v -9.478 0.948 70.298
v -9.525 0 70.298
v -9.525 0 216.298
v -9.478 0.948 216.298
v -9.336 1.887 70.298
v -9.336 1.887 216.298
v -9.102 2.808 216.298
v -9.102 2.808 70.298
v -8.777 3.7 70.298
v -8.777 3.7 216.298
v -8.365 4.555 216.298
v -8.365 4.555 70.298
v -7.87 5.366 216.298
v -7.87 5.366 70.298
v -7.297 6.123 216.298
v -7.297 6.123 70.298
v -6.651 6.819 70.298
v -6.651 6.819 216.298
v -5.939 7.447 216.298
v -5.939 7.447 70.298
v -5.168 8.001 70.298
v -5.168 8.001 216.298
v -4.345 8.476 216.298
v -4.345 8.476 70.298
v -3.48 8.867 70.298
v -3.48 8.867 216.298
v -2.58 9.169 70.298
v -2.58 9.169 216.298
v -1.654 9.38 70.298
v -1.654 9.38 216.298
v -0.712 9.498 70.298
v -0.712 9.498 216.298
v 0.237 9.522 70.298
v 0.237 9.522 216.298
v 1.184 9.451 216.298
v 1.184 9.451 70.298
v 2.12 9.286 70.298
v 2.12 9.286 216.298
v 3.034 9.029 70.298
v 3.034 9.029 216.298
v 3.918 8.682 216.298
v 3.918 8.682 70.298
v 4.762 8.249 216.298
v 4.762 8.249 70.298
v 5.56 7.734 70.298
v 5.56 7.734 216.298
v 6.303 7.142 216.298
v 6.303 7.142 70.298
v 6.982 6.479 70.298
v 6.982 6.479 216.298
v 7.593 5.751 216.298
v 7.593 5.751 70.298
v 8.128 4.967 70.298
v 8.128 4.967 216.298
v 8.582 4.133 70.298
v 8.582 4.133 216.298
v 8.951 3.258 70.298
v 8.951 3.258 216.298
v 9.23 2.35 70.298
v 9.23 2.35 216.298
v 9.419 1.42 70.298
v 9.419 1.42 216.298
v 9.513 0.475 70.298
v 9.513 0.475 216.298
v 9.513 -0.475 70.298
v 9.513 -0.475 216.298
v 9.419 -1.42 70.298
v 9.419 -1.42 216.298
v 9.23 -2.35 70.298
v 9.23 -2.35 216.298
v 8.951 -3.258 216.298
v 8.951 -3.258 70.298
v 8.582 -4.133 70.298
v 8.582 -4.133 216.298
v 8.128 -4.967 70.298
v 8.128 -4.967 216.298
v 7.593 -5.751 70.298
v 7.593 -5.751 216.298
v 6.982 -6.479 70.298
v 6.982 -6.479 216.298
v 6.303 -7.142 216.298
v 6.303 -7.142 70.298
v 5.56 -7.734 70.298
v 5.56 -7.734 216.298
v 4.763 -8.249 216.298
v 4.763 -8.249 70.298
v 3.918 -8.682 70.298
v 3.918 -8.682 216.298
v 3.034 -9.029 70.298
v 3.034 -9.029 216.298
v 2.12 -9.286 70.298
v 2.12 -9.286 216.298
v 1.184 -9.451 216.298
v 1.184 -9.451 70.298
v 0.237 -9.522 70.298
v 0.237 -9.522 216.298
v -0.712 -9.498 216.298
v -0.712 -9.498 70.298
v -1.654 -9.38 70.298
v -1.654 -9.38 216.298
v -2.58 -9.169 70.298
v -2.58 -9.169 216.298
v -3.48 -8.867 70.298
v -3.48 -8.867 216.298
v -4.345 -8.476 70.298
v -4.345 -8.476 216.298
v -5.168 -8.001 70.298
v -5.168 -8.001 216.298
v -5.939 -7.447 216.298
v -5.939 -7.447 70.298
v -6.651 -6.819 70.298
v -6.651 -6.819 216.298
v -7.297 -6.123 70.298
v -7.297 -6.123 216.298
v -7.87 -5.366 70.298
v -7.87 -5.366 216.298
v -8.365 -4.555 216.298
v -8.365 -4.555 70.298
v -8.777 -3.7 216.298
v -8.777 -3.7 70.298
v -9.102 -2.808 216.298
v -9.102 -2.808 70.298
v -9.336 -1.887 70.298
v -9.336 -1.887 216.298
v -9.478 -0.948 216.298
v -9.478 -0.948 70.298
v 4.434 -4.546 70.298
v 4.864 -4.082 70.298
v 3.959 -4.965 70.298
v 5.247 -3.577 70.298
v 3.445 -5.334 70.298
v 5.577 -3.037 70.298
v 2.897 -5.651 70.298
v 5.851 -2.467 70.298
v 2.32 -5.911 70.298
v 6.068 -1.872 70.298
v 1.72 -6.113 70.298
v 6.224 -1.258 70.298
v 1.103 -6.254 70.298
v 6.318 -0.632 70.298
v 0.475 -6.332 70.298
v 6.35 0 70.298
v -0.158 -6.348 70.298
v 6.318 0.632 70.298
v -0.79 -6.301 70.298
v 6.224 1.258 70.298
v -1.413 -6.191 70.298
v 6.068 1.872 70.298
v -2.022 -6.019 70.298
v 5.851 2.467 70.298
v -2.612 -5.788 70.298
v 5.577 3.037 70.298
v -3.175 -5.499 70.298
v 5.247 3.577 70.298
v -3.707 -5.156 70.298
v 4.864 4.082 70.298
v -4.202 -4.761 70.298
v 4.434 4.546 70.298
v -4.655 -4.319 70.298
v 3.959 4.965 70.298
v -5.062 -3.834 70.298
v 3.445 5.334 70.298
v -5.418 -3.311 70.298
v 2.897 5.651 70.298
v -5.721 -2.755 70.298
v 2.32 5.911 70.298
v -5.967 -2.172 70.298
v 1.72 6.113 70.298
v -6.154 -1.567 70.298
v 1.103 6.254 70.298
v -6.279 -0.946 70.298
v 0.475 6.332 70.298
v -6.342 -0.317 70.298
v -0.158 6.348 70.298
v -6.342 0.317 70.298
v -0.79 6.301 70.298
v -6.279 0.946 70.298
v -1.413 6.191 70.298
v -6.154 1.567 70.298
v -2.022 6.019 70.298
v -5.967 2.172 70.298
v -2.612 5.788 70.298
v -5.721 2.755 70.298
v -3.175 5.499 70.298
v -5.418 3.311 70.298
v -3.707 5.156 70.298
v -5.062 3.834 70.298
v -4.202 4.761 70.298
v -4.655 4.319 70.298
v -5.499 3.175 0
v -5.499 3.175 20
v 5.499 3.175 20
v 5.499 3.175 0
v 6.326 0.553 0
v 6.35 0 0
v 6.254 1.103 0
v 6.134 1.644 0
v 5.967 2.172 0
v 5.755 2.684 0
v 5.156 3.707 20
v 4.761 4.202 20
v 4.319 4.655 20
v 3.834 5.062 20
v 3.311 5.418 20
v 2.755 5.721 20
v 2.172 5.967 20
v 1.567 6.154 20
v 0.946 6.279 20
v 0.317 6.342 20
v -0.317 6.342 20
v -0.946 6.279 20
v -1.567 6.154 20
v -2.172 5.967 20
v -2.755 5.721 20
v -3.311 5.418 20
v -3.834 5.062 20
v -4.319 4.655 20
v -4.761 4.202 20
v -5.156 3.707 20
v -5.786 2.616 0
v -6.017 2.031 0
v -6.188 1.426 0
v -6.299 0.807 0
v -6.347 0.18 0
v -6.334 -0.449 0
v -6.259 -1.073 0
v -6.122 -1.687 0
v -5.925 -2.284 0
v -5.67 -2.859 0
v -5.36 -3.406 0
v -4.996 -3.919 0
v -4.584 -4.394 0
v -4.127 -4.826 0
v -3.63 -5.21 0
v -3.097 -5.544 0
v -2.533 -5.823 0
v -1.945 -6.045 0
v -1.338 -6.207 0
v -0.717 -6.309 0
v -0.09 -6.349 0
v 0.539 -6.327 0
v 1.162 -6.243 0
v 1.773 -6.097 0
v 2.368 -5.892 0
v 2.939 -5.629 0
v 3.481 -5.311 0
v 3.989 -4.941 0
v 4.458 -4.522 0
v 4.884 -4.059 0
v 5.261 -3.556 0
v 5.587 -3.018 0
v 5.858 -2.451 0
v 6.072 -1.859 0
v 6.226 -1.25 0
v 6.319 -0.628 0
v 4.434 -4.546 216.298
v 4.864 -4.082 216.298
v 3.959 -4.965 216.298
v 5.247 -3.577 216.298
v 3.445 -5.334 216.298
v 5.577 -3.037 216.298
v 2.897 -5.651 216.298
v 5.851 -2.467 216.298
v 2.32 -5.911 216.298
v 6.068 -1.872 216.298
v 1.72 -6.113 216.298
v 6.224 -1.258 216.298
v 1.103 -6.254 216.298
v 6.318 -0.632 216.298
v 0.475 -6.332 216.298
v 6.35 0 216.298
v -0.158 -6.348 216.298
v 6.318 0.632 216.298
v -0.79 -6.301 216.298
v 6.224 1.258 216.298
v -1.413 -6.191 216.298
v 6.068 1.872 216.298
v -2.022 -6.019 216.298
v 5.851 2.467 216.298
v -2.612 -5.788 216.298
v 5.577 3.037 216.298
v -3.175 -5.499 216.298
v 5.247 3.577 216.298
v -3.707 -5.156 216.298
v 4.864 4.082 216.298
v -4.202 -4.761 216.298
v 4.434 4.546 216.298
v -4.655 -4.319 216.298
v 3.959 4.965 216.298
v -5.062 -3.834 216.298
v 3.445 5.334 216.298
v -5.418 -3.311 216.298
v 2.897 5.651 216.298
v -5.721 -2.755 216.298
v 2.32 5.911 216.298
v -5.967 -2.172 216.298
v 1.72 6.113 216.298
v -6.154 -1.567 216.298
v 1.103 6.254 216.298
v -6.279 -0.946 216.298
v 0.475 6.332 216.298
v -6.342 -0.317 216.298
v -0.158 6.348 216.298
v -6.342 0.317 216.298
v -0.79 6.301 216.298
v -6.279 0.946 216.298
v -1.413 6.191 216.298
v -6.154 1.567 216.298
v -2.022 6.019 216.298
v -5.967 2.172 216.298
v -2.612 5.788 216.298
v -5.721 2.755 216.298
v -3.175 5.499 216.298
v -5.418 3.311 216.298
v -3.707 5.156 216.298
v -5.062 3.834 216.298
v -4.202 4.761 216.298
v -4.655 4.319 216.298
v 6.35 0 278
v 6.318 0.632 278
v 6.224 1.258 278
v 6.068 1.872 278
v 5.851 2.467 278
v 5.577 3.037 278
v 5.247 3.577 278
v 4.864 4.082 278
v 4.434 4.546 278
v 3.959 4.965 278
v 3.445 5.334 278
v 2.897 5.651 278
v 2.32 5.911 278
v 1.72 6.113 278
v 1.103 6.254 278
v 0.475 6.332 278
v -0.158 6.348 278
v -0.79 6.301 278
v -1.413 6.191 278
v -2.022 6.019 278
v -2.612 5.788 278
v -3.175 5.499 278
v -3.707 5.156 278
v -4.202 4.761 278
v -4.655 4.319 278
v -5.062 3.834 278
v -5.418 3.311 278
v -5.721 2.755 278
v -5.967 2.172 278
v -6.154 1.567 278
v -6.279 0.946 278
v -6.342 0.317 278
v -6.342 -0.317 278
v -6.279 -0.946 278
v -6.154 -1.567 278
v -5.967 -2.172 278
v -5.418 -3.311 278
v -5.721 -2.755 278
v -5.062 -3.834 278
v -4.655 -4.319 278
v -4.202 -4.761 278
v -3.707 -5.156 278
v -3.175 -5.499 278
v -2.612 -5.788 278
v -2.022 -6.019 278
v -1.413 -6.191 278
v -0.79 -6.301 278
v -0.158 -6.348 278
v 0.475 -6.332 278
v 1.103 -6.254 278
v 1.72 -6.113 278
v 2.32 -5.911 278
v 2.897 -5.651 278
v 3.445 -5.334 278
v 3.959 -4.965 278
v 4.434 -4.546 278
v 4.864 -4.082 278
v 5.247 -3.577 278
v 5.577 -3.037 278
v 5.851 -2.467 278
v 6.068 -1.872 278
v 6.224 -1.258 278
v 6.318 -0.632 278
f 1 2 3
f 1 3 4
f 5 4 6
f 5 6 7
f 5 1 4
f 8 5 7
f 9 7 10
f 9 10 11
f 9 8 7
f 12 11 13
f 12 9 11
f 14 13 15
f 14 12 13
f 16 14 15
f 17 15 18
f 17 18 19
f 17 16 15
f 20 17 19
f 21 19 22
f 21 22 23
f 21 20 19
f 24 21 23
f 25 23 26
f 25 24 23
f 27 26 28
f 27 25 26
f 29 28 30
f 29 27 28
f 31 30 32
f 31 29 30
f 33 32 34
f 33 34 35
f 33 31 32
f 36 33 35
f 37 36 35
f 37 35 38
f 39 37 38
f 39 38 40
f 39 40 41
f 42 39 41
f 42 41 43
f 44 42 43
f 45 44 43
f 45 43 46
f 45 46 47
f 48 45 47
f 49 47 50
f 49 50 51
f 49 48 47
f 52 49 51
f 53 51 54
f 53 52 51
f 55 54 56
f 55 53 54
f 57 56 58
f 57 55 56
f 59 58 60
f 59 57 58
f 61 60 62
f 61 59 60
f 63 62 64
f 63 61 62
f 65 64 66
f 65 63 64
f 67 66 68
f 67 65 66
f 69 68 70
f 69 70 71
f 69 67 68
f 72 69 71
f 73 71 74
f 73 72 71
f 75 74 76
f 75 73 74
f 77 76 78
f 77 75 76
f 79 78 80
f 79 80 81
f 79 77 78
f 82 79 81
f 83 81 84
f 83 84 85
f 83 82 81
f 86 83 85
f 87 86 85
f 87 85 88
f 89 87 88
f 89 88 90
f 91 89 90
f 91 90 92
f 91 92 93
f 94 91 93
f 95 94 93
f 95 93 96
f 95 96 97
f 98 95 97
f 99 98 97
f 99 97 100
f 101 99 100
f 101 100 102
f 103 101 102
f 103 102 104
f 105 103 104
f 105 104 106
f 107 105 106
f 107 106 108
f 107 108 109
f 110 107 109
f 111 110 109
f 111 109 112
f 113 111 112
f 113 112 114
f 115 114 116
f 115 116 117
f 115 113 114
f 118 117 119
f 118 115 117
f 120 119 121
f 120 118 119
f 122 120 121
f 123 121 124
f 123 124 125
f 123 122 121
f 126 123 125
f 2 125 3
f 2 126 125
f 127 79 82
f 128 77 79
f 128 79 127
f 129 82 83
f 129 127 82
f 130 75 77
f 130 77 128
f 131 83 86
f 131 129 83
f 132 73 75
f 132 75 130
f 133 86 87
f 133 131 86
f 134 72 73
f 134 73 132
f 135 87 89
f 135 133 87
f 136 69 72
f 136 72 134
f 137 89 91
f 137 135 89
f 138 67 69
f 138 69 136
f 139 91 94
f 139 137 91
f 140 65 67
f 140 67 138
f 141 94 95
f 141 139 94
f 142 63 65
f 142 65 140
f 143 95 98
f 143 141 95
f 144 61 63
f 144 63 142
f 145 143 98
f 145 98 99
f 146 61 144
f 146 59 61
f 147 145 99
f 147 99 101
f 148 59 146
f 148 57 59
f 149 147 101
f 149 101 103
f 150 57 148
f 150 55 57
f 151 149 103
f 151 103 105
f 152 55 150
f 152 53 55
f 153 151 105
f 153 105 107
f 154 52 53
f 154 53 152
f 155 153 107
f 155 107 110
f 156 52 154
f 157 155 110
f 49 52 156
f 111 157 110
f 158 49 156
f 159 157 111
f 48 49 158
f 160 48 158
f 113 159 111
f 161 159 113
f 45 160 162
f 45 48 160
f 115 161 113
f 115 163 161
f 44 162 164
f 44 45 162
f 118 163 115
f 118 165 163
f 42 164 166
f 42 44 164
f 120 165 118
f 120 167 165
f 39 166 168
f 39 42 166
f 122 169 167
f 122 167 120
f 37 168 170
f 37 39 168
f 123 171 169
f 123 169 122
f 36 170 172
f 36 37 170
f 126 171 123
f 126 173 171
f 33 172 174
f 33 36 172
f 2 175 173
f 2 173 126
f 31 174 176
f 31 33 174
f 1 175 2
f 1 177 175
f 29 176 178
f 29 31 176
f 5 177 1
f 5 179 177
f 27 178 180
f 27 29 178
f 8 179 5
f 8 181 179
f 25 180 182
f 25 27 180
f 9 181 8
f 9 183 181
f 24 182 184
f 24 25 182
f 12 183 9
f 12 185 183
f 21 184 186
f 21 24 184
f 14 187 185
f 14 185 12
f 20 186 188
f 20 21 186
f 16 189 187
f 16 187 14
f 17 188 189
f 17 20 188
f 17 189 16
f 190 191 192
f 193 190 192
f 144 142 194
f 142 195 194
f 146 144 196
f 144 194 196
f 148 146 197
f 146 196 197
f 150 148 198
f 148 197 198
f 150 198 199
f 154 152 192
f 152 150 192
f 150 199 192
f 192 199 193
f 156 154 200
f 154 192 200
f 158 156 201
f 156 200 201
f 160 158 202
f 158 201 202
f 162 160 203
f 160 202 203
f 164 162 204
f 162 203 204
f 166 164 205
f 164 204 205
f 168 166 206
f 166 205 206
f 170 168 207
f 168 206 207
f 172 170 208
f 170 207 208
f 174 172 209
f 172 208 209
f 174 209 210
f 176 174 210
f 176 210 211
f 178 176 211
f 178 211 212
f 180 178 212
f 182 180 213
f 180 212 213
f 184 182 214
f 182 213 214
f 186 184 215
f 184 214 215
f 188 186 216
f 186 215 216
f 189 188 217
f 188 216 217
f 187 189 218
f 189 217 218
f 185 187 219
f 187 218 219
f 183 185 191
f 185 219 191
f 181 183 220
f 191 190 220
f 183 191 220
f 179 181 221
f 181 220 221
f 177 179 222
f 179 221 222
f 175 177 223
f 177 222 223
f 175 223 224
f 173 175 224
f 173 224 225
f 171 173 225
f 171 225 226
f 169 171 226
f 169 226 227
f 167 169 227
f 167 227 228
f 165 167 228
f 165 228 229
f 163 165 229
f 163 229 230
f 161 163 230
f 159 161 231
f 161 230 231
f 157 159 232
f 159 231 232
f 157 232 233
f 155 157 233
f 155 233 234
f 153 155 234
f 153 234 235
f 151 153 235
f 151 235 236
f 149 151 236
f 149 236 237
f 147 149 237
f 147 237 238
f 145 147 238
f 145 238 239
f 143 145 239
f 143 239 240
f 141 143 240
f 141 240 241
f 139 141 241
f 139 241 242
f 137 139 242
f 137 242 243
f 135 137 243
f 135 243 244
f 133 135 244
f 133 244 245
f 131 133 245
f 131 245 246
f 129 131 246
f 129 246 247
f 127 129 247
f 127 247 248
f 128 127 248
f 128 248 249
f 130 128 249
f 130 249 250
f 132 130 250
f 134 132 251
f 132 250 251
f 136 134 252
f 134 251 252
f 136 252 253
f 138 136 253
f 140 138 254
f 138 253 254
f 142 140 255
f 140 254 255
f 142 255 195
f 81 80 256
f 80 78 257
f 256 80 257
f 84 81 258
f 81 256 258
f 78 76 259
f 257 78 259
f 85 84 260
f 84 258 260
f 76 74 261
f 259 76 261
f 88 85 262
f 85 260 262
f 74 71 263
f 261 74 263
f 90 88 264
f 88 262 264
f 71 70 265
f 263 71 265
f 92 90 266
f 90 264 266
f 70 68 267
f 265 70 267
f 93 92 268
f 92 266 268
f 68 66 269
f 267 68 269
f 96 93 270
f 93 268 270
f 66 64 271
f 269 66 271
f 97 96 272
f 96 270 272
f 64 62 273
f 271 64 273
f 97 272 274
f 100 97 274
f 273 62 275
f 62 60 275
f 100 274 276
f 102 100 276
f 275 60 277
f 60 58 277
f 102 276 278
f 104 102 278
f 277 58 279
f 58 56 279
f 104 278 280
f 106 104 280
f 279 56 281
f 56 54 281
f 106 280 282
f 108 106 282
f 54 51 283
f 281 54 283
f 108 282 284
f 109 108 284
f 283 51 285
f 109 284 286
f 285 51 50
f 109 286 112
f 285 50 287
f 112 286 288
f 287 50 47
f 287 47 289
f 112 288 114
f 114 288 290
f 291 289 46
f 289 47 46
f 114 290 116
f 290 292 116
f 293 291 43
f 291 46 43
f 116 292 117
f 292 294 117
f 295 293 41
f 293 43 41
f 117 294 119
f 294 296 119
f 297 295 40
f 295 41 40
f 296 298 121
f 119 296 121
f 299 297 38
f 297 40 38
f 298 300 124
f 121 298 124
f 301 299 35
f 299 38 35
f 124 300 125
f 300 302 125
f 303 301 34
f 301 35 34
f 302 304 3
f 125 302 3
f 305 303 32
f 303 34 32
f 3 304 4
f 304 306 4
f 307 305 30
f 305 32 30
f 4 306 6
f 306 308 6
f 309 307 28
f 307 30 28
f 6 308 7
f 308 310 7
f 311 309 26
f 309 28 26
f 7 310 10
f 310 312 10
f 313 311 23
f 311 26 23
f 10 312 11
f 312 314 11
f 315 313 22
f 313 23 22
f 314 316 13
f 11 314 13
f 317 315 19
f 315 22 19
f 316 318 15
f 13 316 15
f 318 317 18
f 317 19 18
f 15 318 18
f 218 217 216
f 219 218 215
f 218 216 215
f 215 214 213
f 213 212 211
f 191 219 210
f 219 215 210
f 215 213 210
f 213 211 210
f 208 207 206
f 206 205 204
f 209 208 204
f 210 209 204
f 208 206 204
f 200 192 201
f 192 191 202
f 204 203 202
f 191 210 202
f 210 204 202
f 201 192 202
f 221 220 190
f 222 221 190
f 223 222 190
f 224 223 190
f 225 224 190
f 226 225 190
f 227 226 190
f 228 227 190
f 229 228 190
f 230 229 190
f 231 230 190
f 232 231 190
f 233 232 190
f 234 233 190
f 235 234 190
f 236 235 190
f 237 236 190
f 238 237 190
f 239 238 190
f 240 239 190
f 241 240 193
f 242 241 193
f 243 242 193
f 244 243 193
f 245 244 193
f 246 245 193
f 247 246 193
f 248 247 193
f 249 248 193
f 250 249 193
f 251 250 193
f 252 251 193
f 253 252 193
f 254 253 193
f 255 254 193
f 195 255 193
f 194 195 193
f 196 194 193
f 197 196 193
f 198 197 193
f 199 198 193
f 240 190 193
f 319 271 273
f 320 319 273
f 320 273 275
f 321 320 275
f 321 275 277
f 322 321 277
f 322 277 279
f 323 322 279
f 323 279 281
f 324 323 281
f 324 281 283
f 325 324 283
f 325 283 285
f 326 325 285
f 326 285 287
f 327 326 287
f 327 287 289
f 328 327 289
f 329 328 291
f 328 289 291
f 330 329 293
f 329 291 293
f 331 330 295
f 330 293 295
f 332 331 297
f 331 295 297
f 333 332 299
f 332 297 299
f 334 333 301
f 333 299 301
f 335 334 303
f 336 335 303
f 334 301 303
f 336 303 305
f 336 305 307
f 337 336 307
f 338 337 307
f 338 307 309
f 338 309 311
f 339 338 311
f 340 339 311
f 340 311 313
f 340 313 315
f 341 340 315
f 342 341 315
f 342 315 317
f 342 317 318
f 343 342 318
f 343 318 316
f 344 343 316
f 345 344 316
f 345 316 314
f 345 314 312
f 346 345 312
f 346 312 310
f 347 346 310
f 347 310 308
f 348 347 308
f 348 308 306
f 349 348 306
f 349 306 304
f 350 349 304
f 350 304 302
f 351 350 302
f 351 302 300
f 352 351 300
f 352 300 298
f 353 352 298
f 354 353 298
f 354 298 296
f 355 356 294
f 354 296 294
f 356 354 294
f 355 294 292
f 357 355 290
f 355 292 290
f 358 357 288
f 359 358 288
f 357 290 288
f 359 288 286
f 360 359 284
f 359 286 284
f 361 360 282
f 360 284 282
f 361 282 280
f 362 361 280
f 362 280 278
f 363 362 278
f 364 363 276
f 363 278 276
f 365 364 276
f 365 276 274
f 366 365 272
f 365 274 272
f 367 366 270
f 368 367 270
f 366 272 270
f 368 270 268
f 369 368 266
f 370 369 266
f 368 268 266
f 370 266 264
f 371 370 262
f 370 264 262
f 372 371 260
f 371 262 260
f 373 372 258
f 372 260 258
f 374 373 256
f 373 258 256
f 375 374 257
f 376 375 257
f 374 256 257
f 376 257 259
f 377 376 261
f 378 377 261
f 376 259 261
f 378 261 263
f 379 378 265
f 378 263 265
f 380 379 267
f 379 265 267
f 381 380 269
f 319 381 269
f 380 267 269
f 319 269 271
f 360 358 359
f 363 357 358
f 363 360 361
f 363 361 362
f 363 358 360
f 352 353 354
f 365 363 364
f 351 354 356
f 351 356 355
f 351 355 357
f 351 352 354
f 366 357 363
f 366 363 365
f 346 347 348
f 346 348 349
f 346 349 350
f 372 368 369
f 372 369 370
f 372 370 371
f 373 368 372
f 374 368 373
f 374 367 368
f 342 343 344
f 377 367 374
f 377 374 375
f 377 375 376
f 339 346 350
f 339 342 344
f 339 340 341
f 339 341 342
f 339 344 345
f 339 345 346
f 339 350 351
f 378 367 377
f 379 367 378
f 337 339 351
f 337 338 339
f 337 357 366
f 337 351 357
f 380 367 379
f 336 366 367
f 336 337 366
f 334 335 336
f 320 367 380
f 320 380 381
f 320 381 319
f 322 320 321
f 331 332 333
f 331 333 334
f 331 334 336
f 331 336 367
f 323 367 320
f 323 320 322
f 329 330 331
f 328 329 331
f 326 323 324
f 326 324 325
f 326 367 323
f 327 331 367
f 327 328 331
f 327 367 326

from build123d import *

# Parameters (mm, degrees)
SKETCH1_R           = 6.35
BOSS_EXTRUDE1_DEPTH = 278
BOSS_EXTRUDE2_START = -70.2975
SKETCH2_R           = 9.525
BOSS_EXTRUDE2_DEPTH = 146
CUT_EXTRUDE4_DEPTH  = 20


with BuildPart() as part:
    # Sketch1 → Boss-Extrude1 (new body)
    with BuildSketch(Plane.XY):
        Circle(SKETCH1_R)
    extrude(amount=BOSS_EXTRUDE1_DEPTH)

    # Sketch2 → Boss-Extrude2 (add)
    with BuildSketch(Plane(origin=(0, 0, 0), x_dir=(-1, 0, 0), z_dir=(0, 0, -1)).offset(BOSS_EXTRUDE2_START)):
        Circle(SKETCH2_R)
    extrude(amount=-BOSS_EXTRUDE2_DEPTH)

    # Sketch7 → Cut-Extrude4 (cut)
    with BuildSketch(Plane.XY):
        with BuildLine():
            Line((-5.499261314, 3.175), (5.499261314, 3.175))
            ThreePointArc((5.499261314, 3.175), (0, 6.35), (-5.499261314, 3.175))
        make_face()
    extrude(amount=CUT_EXTRUDE4_DEPTH, mode=Mode.SUBTRACT)


solid = part.part
